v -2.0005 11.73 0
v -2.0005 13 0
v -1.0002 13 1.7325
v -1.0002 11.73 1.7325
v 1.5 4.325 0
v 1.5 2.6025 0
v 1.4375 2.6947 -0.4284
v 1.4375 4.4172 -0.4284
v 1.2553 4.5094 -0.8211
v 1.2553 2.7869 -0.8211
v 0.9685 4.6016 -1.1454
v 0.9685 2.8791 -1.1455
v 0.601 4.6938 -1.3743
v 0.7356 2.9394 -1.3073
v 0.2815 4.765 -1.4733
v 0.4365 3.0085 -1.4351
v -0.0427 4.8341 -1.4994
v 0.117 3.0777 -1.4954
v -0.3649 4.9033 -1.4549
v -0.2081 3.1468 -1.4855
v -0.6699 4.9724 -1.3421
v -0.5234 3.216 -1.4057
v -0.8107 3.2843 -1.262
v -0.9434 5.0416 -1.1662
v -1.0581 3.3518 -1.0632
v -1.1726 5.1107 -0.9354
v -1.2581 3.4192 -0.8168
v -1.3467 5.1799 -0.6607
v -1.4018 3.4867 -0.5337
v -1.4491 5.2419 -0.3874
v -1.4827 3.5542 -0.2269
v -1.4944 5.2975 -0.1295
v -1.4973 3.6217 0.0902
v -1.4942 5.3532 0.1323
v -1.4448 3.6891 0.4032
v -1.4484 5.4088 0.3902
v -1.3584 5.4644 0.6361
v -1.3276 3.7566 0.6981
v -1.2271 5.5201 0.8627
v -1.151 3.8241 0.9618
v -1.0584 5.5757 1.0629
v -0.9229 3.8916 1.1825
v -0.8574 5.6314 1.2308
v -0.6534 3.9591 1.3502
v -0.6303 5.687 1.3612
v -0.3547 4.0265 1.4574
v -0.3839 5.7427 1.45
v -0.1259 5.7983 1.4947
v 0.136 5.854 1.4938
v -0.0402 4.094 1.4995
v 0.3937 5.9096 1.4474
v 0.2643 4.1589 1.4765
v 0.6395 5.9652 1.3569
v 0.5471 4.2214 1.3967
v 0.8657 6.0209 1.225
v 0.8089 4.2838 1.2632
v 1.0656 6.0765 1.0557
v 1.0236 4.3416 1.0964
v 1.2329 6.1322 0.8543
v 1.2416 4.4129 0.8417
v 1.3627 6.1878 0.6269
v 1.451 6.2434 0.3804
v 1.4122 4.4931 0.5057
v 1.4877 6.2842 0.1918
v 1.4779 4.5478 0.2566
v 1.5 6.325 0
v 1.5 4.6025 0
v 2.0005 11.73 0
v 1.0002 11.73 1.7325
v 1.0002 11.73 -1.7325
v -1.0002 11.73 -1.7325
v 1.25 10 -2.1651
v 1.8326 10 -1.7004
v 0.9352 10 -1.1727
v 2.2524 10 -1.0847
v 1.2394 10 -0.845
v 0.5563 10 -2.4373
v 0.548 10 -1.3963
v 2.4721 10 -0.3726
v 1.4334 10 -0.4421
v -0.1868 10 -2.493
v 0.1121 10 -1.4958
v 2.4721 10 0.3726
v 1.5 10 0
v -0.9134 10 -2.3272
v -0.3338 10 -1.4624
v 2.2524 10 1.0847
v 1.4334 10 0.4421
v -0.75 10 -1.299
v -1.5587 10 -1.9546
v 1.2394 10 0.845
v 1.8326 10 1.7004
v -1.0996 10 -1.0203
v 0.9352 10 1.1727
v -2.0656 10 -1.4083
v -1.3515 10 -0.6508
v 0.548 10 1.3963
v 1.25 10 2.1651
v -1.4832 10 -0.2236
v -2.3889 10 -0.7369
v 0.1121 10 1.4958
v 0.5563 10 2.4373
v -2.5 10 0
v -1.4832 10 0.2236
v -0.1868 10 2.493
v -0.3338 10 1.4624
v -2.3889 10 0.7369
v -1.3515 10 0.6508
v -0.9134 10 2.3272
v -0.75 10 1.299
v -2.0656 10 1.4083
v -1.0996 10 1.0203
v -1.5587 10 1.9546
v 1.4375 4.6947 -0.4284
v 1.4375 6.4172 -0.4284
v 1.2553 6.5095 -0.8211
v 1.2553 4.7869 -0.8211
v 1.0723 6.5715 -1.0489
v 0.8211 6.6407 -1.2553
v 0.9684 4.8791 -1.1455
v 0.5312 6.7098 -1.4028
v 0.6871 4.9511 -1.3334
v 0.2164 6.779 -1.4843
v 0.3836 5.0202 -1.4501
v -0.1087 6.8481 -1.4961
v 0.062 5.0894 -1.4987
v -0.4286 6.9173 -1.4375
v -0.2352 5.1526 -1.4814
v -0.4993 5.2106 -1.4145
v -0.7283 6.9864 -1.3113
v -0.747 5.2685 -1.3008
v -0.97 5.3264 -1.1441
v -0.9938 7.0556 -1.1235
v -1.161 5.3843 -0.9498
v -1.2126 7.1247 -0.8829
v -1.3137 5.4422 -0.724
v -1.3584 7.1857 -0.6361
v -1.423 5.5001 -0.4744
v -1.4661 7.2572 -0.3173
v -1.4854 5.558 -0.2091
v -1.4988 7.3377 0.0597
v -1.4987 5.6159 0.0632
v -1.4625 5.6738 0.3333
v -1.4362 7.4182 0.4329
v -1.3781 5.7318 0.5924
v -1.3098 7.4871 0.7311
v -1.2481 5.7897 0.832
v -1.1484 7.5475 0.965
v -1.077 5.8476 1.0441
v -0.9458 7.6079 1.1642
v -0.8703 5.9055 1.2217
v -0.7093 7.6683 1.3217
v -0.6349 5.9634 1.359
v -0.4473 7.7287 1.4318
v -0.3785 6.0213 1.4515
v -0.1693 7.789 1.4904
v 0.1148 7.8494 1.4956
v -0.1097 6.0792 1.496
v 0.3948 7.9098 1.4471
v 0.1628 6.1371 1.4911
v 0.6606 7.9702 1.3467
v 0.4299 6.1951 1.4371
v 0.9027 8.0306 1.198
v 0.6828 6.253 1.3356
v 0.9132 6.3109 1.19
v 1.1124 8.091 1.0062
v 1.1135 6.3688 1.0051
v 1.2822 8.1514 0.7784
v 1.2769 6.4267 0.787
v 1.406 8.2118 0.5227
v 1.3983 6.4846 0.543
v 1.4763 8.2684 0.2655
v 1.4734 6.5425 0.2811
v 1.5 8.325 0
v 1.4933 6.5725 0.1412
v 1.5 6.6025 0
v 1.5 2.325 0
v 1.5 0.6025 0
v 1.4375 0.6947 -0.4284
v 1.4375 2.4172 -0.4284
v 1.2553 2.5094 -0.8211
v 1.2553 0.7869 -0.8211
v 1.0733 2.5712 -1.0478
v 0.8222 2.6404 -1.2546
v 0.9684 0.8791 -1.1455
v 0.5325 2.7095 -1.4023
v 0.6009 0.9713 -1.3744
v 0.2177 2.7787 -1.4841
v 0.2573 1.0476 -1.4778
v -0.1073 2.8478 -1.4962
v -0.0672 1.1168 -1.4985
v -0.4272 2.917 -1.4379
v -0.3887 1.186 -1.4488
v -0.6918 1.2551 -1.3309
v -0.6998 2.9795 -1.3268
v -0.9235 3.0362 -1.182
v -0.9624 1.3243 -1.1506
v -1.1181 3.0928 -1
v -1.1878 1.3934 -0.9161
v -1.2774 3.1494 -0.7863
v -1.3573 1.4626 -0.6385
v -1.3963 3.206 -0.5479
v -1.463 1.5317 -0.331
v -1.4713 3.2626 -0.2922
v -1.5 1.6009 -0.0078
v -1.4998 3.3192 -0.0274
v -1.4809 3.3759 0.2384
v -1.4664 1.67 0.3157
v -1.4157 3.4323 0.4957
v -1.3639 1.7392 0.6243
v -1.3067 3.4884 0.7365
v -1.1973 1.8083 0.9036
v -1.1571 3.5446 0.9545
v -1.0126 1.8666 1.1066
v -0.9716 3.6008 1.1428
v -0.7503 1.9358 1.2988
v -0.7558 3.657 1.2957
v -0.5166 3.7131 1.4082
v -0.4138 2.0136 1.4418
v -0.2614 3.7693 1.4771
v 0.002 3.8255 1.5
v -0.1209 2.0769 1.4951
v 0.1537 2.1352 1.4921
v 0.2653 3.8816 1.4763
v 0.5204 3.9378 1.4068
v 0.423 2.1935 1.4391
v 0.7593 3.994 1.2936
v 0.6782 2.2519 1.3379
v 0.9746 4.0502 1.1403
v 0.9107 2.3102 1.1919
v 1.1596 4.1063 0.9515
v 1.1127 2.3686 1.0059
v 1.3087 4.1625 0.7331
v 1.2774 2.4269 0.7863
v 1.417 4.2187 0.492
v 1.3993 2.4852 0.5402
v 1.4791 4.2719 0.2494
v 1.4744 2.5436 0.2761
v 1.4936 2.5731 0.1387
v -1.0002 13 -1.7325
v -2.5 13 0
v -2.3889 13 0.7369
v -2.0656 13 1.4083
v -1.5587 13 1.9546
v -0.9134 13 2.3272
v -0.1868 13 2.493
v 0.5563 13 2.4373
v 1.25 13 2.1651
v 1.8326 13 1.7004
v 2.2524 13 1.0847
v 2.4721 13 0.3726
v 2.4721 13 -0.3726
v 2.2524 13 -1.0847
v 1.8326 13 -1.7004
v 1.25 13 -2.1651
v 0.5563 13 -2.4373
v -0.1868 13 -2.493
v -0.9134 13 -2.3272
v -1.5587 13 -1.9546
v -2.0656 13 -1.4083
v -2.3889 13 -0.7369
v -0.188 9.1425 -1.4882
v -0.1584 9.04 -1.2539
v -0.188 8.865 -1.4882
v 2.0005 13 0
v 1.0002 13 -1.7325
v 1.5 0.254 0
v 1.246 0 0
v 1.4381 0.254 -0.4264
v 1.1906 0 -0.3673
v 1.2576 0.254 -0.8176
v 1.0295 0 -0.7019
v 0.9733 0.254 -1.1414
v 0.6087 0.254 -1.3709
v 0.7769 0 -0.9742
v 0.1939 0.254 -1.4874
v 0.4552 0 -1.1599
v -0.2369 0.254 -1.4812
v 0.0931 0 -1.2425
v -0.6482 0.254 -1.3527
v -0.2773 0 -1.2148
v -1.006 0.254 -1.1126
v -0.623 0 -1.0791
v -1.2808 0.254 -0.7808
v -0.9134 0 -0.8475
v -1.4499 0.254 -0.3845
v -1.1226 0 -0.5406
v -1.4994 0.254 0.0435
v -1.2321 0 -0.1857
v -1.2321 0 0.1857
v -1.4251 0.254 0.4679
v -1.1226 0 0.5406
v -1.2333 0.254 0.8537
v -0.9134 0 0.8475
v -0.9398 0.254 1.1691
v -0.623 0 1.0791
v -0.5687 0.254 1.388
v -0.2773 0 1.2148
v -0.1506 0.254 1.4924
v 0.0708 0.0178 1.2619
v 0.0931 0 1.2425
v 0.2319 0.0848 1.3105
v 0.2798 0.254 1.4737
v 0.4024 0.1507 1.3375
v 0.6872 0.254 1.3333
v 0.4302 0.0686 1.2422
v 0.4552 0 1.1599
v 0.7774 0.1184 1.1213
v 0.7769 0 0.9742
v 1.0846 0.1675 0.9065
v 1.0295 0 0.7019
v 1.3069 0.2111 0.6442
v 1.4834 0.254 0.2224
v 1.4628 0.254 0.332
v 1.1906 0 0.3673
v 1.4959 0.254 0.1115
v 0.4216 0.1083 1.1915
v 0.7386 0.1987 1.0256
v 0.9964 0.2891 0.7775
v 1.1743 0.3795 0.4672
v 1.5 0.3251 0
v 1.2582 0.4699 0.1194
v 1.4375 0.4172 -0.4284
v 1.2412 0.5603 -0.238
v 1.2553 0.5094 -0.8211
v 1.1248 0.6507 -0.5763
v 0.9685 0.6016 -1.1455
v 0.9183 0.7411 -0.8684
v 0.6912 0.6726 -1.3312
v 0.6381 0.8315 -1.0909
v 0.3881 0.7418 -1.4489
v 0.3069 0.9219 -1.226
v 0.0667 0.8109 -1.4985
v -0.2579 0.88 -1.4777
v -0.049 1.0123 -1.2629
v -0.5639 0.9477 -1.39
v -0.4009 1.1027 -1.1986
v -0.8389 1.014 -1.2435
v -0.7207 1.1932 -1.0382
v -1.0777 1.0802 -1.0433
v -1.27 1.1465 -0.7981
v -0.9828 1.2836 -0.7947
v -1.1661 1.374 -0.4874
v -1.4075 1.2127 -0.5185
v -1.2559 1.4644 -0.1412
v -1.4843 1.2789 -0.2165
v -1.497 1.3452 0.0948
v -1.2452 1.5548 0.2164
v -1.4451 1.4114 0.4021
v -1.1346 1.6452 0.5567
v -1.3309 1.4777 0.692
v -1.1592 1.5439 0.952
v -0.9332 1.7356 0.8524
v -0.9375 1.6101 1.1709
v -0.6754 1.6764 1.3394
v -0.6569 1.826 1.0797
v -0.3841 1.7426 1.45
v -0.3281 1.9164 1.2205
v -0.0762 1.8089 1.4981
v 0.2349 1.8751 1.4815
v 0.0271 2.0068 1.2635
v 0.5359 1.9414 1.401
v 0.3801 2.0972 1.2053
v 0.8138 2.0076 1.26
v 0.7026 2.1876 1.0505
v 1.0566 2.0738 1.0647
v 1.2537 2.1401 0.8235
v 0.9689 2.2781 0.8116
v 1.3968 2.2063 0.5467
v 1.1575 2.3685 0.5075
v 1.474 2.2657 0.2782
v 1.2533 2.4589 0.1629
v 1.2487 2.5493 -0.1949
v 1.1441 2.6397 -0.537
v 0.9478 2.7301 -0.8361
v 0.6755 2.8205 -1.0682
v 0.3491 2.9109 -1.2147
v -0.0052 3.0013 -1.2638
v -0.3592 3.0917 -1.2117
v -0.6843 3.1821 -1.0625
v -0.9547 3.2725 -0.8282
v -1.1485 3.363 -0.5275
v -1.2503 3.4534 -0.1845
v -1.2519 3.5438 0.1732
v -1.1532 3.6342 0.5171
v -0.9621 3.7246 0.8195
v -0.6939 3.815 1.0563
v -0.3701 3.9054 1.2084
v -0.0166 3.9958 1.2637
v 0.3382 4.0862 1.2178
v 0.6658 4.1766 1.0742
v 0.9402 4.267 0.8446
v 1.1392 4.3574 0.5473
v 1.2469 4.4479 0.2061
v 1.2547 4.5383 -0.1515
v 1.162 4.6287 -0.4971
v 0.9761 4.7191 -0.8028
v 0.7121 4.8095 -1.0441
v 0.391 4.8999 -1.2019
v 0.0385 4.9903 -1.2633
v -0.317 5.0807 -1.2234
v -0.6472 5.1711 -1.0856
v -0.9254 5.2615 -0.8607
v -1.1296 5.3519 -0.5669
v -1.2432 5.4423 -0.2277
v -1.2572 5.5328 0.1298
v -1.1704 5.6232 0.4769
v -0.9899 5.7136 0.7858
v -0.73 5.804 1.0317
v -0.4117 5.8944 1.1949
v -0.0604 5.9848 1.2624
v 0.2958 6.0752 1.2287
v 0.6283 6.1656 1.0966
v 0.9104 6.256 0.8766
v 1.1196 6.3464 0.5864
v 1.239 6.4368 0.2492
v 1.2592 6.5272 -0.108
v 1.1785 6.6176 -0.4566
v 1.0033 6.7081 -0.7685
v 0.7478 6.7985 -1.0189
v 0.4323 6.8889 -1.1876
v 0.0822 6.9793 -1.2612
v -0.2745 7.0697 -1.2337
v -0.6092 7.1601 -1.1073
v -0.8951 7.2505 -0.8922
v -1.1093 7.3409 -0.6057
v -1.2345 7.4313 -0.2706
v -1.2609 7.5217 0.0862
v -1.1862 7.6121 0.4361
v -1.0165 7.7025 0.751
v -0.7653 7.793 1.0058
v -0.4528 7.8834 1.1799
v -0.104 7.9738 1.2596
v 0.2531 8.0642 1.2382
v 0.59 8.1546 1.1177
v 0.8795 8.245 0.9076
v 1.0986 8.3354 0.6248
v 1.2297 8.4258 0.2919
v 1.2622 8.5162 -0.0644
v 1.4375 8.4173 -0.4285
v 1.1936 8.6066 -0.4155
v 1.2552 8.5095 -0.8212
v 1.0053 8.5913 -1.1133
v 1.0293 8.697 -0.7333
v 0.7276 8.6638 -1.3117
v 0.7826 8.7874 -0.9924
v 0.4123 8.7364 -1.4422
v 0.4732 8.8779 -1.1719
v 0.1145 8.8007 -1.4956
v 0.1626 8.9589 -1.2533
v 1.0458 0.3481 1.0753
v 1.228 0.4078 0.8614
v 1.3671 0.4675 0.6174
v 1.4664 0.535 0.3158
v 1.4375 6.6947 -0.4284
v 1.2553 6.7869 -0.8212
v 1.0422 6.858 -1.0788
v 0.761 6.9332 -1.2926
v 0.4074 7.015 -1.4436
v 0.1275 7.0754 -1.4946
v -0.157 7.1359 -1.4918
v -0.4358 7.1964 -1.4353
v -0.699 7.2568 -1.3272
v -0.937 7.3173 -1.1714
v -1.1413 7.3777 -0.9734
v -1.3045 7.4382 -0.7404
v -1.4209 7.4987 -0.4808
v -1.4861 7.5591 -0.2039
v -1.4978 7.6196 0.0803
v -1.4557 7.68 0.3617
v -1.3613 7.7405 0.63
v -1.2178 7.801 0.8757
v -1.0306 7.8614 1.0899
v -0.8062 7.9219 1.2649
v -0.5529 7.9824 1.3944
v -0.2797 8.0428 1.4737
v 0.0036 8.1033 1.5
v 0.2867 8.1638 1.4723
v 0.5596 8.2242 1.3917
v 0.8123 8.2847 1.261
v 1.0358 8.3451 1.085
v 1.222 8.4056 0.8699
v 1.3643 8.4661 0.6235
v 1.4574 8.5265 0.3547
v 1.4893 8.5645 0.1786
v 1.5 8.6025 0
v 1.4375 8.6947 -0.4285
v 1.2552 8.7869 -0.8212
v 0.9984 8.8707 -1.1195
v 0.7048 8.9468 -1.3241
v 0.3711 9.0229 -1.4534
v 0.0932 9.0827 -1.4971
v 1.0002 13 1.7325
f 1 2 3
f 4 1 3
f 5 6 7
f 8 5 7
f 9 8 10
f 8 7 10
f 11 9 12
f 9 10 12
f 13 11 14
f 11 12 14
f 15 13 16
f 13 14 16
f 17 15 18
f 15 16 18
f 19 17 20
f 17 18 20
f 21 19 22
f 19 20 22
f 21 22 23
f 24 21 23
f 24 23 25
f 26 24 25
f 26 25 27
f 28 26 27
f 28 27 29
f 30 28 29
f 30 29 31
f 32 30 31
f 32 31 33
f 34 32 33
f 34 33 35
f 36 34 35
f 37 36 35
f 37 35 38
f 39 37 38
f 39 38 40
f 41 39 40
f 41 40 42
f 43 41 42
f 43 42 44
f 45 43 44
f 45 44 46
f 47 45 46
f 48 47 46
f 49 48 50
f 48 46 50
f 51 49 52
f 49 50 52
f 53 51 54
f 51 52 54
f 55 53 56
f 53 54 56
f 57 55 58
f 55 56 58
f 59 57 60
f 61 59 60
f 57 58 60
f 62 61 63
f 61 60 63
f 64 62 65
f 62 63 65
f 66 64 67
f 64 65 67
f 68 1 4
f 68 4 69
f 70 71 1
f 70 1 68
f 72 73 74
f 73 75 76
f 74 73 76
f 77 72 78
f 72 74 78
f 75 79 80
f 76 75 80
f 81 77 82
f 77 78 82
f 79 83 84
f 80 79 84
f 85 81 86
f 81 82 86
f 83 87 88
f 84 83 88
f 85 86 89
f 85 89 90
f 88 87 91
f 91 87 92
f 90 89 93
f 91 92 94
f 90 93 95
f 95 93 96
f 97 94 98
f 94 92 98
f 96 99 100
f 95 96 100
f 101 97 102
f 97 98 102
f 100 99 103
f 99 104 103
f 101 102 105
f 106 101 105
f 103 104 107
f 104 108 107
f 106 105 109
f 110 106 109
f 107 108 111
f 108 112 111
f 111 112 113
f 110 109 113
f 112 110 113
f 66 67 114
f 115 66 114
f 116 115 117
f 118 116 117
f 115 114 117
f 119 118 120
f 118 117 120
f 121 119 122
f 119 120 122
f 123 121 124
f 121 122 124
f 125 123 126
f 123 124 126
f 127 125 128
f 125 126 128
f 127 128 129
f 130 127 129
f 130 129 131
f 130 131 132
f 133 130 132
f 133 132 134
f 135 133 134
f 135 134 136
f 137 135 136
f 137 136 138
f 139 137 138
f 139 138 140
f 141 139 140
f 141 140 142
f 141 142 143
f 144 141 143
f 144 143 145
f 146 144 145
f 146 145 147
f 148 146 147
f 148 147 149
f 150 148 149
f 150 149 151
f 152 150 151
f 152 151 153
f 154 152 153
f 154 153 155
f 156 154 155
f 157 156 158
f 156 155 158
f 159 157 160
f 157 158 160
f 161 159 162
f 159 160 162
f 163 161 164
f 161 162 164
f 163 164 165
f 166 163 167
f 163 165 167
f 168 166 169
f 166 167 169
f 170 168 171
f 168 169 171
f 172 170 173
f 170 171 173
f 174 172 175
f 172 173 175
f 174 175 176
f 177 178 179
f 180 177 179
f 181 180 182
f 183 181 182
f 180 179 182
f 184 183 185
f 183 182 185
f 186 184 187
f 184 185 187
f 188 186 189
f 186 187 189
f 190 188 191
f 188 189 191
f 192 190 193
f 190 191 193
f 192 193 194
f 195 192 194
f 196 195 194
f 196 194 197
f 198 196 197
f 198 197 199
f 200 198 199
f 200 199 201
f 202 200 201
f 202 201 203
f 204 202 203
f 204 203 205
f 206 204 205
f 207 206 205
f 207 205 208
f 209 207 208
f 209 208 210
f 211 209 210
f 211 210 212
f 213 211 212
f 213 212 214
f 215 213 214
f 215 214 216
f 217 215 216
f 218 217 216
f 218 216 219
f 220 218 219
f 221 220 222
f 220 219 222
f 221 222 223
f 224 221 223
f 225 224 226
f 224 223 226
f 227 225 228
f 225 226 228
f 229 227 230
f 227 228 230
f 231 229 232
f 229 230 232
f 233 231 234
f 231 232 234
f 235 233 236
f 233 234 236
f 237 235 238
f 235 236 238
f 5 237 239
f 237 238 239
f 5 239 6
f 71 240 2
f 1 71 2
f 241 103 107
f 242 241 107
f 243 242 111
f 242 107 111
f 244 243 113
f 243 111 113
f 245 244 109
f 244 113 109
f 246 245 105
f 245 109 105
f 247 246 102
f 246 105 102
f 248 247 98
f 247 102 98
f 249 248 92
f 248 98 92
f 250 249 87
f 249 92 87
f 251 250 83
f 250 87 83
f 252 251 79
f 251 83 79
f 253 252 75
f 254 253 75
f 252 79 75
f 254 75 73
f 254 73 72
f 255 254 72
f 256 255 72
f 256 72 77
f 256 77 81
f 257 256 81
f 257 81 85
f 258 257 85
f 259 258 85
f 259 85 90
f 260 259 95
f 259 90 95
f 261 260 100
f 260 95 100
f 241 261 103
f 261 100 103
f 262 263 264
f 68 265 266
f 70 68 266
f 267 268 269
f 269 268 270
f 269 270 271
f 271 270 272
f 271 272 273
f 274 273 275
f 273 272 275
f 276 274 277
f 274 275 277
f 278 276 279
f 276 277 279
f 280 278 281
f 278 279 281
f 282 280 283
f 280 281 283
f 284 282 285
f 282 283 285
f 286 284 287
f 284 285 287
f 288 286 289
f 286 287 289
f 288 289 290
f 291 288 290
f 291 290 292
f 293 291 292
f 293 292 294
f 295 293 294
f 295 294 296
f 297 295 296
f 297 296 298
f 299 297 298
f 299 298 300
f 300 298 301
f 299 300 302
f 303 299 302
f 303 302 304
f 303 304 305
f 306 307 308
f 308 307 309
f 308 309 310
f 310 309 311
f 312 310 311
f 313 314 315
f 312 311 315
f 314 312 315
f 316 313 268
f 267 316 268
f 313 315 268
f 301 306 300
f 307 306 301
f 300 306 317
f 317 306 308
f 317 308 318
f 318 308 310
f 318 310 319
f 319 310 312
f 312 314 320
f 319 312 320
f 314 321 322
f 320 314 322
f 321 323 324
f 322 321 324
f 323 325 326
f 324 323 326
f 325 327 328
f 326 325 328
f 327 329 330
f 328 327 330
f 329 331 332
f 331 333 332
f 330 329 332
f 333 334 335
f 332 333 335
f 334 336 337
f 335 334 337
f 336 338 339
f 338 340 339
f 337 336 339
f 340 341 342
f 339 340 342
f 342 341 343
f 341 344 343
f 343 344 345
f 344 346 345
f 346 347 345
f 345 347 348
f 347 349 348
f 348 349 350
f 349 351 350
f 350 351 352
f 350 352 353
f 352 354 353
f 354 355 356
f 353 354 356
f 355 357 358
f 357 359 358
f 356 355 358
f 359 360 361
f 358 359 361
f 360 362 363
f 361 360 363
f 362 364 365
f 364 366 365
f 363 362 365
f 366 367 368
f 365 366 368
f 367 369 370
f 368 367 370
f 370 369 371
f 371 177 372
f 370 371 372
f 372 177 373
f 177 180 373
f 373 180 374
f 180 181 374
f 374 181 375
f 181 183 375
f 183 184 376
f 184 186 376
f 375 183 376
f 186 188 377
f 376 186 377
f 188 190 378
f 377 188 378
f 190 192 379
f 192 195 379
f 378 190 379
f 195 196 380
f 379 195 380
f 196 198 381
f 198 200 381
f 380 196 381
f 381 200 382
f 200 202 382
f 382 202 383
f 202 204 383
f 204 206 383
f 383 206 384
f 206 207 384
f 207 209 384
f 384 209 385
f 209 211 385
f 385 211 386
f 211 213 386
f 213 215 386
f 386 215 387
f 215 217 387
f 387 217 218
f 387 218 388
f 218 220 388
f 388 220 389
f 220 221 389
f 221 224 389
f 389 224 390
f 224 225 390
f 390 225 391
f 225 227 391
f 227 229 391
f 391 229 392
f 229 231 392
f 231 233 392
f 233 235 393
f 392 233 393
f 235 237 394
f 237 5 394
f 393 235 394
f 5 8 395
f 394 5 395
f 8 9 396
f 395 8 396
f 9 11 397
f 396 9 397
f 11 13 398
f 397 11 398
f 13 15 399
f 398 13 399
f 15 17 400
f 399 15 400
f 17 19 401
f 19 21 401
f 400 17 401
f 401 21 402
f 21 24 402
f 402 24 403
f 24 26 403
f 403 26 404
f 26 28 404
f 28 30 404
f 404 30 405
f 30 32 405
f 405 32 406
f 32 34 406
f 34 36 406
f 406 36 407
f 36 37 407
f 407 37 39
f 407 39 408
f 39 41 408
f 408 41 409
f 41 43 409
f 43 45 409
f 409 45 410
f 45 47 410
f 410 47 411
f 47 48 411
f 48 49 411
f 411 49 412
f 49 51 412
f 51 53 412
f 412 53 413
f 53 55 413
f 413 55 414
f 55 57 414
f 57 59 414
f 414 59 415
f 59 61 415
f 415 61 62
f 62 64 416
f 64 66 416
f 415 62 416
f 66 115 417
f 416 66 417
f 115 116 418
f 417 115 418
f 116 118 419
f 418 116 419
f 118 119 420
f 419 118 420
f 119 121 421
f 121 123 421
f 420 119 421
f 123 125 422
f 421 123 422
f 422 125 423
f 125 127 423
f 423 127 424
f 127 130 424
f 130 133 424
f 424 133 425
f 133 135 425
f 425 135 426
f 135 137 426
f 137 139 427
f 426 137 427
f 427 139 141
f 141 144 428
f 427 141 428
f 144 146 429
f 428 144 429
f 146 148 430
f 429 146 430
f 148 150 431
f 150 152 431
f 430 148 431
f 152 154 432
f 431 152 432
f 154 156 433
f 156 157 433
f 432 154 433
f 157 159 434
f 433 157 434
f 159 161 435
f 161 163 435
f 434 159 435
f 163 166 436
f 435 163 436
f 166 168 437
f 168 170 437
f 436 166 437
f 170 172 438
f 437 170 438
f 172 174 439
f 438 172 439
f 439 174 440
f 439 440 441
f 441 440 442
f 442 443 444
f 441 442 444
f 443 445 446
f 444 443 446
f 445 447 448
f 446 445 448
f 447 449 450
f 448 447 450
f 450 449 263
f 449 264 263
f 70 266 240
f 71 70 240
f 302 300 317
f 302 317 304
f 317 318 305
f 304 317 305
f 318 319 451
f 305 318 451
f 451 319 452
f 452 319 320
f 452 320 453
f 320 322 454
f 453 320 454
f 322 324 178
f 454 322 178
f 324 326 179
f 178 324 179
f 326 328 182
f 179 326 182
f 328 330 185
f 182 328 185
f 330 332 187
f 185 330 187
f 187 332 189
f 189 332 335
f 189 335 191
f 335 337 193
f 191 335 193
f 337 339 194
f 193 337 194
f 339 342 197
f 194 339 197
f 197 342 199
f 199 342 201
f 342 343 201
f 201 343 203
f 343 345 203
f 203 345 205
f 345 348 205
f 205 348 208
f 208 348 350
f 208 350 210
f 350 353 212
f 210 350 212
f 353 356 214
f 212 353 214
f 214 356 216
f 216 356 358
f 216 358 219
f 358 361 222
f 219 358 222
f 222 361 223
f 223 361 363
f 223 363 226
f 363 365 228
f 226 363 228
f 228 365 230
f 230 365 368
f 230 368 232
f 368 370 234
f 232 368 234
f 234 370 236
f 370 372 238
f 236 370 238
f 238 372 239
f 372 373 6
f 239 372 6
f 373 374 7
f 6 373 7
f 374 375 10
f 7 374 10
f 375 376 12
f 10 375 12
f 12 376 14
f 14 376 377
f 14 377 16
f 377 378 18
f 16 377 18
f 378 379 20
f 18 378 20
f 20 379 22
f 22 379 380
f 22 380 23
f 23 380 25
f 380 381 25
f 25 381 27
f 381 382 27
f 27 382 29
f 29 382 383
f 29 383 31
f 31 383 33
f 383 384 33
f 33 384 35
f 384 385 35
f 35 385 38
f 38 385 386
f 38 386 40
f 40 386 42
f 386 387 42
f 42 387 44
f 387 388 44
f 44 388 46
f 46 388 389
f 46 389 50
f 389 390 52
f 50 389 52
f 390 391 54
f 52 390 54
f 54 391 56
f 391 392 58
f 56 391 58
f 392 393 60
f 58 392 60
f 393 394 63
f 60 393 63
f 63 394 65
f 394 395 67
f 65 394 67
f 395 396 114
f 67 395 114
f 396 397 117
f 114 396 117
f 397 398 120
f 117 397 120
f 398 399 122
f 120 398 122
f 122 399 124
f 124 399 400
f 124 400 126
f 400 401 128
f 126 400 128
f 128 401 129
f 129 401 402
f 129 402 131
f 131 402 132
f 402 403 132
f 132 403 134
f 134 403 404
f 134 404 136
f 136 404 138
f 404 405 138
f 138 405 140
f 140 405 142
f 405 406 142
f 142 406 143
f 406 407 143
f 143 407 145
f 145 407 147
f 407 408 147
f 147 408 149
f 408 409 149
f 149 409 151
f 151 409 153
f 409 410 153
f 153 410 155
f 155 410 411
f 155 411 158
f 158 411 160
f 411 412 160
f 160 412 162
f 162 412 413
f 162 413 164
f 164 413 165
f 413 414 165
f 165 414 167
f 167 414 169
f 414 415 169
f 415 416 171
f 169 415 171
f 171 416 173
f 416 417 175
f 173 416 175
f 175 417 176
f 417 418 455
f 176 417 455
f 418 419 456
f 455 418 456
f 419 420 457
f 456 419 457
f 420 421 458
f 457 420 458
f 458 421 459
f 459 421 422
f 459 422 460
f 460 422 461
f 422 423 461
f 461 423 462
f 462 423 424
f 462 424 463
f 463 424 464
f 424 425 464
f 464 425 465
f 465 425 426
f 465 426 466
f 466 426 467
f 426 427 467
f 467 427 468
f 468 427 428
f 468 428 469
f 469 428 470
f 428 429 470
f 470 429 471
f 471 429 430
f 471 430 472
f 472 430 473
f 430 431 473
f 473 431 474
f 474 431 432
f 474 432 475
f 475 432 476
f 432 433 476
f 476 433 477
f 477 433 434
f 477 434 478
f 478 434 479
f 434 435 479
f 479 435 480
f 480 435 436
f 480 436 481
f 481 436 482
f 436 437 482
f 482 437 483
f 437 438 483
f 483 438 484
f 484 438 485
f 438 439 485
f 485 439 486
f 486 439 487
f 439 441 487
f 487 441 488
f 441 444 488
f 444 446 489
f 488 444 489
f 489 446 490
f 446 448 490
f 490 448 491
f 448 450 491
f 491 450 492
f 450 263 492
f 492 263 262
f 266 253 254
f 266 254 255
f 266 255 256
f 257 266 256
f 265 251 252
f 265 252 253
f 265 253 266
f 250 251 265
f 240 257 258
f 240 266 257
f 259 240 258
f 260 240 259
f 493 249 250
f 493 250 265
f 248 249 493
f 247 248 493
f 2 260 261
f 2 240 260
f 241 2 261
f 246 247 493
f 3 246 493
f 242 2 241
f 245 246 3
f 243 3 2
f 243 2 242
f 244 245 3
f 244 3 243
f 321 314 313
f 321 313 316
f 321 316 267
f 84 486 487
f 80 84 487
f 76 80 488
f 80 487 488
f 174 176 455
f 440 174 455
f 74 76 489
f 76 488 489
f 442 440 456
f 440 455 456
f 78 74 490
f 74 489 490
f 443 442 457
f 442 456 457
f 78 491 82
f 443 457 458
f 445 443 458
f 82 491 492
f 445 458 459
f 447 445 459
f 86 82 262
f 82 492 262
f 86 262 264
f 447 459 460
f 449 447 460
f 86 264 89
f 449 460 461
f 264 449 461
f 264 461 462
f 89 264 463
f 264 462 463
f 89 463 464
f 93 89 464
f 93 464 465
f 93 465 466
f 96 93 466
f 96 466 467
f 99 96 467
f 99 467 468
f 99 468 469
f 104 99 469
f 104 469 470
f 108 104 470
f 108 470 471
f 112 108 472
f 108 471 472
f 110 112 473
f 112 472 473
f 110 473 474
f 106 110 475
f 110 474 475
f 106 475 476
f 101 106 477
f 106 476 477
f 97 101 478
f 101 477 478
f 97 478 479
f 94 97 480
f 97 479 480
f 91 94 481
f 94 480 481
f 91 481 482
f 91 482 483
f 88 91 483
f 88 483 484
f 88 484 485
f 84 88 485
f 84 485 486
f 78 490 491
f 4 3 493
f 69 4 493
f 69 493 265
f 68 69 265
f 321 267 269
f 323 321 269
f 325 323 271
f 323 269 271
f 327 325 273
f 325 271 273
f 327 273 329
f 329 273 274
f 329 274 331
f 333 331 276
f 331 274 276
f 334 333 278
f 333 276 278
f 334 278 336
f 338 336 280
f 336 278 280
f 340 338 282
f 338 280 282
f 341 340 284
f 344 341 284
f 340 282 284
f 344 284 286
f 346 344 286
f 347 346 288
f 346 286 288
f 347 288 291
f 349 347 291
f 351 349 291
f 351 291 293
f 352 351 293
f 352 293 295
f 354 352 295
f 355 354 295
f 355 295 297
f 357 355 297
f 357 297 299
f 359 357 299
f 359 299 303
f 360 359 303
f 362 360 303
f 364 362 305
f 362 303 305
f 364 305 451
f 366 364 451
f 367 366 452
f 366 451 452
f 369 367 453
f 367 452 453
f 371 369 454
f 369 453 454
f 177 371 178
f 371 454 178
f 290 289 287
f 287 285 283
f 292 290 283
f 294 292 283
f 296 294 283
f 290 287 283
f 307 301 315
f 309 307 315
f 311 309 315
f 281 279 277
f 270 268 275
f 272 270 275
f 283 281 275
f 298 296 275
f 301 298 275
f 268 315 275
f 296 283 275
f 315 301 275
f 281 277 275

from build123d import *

# Parameters (mm, degrees)
SKETCH1_R           = 1.5
BOSS_EXTRUDE1_DEPTH = 10
SKETCH2_R           = 2.5
BOSS_EXTRUDE2_DEPTH = 3
CUT_EXTRUDE2_DEPTH  = 1.27
CHAMFER1_SIZE       = 0.254
CUT_SWEEP4_PITCH    = 2
CUT_SWEEP4_HEIGHT   = 9.04
CUT_SWEEP4_RADIUS   = 1.259947043


with BuildPart() as part:
    # Sketch1 → Boss-Extrude1 (new body)
    with BuildSketch(Plane(origin=(0, 0, 0), x_dir=(1, 0, 0), z_dir=(0, 1, 0))):
        Circle(SKETCH1_R)
    extrude(amount=BOSS_EXTRUDE1_DEPTH)

    # Sketch2 → Boss-Extrude2 (add)
    with BuildSketch(Plane(origin=(0, 10, 0), x_dir=(-1, 0, 0), z_dir=(0, 1, 0))):
        Circle(SKETCH2_R)
    extrude(amount=BOSS_EXTRUDE2_DEPTH)

    # Sketch3 → Cut-Extrude2 (cut)
    with BuildSketch(Plane(origin=(0, 13, 0), x_dir=(1, 0, 0), z_dir=(0, 1, 0))):
        Polygon((2.000485358, 0), (1.000242679, 1.73247114), (-1.000242679, 1.73247114), (-2.000485358, 0), (-1.000242679, -1.73247114), (1.000242679, -1.73247114), align=None)
    extrude(amount=-CUT_EXTRUDE2_DEPTH, mode=Mode.SUBTRACT)

    # Chamfer1
    chamfer1_edges = [part.edges().sort_by_distance(p)[0] for p in [
        (-1.5, 0, 0),
    ]]
    chamfer(chamfer1_edges, length=CHAMFER1_SIZE)

    # Cut-Sweep4: sweep along a helix
    with BuildLine() as cut_sweep4_path:
        Helix(CUT_SWEEP4_PITCH, CUT_SWEEP4_HEIGHT, CUT_SWEEP4_RADIUS, center=(0, 0, 0), direction=(0, 1, 0))
    # Sketch6 → Cut-Sweep4 (sweep, cut)
    with BuildSketch(Plane(origin=(0, 0, 0), x_dir=(0, 0, -1), z_dir=(1, 0, 0))):
        Polygon((-1.263842547, 0), (-2.577025719, 0.570115155), (-2.41416834, -0.852192409), align=None)
    sweep(path=cut_sweep4_path.line, is_frenet=True, mode=Mode.SUBTRACT)


solid = part.part
